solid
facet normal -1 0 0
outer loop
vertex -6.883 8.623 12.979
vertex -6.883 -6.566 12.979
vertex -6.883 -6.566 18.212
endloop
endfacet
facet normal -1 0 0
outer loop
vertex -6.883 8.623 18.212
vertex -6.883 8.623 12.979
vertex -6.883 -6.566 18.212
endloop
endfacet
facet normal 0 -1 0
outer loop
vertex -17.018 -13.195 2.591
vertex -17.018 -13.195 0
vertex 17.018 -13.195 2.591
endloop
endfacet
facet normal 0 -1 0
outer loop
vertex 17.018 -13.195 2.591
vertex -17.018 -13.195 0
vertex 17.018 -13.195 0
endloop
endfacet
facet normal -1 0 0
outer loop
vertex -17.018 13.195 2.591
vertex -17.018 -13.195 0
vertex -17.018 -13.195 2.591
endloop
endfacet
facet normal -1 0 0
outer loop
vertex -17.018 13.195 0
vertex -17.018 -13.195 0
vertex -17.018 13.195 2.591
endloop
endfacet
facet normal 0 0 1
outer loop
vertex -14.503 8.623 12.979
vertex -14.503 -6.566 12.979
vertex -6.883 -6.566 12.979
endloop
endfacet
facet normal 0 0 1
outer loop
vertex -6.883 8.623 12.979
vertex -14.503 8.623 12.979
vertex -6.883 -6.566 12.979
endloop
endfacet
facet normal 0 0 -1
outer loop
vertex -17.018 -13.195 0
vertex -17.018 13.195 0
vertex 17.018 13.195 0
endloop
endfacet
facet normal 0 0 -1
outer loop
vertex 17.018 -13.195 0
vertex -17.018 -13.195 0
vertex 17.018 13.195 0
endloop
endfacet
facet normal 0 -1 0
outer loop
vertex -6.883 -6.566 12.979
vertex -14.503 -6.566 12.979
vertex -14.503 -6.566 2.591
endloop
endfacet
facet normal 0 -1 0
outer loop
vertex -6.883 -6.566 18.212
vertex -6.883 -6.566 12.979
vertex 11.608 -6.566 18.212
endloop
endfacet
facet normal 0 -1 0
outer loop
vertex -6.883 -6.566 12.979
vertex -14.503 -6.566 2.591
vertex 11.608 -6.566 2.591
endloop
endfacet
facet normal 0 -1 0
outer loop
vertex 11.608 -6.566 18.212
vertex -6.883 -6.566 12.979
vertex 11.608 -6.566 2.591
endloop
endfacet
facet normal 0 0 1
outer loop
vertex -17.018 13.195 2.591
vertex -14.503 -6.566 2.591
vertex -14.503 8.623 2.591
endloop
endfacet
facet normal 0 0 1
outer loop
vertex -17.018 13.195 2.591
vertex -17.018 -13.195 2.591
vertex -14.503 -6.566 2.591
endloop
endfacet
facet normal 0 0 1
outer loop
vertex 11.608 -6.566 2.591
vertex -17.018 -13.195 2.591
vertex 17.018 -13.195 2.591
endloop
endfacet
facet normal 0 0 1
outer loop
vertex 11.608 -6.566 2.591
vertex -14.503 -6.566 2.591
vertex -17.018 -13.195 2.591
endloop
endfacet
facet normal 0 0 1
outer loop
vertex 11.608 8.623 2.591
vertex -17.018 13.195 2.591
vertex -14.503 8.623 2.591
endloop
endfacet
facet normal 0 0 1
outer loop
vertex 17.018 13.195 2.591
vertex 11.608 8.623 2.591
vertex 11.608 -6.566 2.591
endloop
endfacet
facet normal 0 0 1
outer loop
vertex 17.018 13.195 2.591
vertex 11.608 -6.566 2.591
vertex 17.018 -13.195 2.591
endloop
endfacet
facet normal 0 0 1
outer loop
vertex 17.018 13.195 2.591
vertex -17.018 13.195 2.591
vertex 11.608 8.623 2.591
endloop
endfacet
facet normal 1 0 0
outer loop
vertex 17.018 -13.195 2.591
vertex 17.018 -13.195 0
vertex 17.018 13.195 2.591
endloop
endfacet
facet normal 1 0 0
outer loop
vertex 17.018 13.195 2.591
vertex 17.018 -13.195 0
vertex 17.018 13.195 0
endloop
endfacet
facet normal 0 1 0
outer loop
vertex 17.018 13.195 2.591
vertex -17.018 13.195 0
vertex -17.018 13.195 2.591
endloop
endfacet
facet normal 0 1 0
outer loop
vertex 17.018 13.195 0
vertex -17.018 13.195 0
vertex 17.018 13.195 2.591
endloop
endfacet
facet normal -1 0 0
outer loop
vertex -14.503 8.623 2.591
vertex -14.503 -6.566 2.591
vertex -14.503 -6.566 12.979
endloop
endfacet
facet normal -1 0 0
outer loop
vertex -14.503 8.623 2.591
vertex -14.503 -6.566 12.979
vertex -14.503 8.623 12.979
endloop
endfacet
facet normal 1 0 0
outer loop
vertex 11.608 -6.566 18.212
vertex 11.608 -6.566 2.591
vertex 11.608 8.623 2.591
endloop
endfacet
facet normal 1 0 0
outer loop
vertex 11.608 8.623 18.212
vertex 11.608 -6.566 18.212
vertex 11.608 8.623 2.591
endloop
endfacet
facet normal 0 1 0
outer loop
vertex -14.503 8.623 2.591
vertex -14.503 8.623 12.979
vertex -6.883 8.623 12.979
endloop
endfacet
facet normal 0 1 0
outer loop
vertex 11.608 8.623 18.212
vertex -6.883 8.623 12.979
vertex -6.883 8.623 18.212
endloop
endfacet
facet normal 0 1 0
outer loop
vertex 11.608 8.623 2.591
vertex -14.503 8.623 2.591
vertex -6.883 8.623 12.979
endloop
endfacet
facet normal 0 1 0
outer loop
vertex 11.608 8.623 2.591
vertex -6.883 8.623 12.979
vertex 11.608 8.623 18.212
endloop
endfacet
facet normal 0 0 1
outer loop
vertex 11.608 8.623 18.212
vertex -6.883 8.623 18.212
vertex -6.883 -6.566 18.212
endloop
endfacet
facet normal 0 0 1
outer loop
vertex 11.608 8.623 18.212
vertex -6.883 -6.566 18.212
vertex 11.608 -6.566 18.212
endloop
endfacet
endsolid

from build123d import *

# Parameters (mm, degrees)
F0_W     = 34.036
F0_H     = 26.3906
F1_DEPTH = 2.5908
F2_W     = 26.1112
F2_H     = 15.1892
F3_DEPTH = 15.621
F4_W     = 7.62
F4_H     = 5.2324
F5_DEPTH = 19.7622


with BuildPart() as f1:
    # F0 (on Top) → F1 (new body)
    with BuildSketch(Plane.XY):
        Rectangle(F0_W, F0_H)
    extrude(amount=F1_DEPTH)

    # F2 (on face) → F3 (join)
    with BuildSketch(Plane.XY.offset(2.5908)):
        with Locations((-1.4478, 1.0287)):
            Rectangle(F2_W, F2_H)
    extrude(amount=F3_DEPTH)

    # F4 (on face) → F5 (cut, through all)
    with BuildSketch(Plane.XZ.offset(6.5659)):
        with Locations((-10.6934, 15.5956)):
            Rectangle(F4_W, F4_H)
    extrude(amount=-F5_DEPTH, mode=Mode.SUBTRACT)


solid = f1.part
